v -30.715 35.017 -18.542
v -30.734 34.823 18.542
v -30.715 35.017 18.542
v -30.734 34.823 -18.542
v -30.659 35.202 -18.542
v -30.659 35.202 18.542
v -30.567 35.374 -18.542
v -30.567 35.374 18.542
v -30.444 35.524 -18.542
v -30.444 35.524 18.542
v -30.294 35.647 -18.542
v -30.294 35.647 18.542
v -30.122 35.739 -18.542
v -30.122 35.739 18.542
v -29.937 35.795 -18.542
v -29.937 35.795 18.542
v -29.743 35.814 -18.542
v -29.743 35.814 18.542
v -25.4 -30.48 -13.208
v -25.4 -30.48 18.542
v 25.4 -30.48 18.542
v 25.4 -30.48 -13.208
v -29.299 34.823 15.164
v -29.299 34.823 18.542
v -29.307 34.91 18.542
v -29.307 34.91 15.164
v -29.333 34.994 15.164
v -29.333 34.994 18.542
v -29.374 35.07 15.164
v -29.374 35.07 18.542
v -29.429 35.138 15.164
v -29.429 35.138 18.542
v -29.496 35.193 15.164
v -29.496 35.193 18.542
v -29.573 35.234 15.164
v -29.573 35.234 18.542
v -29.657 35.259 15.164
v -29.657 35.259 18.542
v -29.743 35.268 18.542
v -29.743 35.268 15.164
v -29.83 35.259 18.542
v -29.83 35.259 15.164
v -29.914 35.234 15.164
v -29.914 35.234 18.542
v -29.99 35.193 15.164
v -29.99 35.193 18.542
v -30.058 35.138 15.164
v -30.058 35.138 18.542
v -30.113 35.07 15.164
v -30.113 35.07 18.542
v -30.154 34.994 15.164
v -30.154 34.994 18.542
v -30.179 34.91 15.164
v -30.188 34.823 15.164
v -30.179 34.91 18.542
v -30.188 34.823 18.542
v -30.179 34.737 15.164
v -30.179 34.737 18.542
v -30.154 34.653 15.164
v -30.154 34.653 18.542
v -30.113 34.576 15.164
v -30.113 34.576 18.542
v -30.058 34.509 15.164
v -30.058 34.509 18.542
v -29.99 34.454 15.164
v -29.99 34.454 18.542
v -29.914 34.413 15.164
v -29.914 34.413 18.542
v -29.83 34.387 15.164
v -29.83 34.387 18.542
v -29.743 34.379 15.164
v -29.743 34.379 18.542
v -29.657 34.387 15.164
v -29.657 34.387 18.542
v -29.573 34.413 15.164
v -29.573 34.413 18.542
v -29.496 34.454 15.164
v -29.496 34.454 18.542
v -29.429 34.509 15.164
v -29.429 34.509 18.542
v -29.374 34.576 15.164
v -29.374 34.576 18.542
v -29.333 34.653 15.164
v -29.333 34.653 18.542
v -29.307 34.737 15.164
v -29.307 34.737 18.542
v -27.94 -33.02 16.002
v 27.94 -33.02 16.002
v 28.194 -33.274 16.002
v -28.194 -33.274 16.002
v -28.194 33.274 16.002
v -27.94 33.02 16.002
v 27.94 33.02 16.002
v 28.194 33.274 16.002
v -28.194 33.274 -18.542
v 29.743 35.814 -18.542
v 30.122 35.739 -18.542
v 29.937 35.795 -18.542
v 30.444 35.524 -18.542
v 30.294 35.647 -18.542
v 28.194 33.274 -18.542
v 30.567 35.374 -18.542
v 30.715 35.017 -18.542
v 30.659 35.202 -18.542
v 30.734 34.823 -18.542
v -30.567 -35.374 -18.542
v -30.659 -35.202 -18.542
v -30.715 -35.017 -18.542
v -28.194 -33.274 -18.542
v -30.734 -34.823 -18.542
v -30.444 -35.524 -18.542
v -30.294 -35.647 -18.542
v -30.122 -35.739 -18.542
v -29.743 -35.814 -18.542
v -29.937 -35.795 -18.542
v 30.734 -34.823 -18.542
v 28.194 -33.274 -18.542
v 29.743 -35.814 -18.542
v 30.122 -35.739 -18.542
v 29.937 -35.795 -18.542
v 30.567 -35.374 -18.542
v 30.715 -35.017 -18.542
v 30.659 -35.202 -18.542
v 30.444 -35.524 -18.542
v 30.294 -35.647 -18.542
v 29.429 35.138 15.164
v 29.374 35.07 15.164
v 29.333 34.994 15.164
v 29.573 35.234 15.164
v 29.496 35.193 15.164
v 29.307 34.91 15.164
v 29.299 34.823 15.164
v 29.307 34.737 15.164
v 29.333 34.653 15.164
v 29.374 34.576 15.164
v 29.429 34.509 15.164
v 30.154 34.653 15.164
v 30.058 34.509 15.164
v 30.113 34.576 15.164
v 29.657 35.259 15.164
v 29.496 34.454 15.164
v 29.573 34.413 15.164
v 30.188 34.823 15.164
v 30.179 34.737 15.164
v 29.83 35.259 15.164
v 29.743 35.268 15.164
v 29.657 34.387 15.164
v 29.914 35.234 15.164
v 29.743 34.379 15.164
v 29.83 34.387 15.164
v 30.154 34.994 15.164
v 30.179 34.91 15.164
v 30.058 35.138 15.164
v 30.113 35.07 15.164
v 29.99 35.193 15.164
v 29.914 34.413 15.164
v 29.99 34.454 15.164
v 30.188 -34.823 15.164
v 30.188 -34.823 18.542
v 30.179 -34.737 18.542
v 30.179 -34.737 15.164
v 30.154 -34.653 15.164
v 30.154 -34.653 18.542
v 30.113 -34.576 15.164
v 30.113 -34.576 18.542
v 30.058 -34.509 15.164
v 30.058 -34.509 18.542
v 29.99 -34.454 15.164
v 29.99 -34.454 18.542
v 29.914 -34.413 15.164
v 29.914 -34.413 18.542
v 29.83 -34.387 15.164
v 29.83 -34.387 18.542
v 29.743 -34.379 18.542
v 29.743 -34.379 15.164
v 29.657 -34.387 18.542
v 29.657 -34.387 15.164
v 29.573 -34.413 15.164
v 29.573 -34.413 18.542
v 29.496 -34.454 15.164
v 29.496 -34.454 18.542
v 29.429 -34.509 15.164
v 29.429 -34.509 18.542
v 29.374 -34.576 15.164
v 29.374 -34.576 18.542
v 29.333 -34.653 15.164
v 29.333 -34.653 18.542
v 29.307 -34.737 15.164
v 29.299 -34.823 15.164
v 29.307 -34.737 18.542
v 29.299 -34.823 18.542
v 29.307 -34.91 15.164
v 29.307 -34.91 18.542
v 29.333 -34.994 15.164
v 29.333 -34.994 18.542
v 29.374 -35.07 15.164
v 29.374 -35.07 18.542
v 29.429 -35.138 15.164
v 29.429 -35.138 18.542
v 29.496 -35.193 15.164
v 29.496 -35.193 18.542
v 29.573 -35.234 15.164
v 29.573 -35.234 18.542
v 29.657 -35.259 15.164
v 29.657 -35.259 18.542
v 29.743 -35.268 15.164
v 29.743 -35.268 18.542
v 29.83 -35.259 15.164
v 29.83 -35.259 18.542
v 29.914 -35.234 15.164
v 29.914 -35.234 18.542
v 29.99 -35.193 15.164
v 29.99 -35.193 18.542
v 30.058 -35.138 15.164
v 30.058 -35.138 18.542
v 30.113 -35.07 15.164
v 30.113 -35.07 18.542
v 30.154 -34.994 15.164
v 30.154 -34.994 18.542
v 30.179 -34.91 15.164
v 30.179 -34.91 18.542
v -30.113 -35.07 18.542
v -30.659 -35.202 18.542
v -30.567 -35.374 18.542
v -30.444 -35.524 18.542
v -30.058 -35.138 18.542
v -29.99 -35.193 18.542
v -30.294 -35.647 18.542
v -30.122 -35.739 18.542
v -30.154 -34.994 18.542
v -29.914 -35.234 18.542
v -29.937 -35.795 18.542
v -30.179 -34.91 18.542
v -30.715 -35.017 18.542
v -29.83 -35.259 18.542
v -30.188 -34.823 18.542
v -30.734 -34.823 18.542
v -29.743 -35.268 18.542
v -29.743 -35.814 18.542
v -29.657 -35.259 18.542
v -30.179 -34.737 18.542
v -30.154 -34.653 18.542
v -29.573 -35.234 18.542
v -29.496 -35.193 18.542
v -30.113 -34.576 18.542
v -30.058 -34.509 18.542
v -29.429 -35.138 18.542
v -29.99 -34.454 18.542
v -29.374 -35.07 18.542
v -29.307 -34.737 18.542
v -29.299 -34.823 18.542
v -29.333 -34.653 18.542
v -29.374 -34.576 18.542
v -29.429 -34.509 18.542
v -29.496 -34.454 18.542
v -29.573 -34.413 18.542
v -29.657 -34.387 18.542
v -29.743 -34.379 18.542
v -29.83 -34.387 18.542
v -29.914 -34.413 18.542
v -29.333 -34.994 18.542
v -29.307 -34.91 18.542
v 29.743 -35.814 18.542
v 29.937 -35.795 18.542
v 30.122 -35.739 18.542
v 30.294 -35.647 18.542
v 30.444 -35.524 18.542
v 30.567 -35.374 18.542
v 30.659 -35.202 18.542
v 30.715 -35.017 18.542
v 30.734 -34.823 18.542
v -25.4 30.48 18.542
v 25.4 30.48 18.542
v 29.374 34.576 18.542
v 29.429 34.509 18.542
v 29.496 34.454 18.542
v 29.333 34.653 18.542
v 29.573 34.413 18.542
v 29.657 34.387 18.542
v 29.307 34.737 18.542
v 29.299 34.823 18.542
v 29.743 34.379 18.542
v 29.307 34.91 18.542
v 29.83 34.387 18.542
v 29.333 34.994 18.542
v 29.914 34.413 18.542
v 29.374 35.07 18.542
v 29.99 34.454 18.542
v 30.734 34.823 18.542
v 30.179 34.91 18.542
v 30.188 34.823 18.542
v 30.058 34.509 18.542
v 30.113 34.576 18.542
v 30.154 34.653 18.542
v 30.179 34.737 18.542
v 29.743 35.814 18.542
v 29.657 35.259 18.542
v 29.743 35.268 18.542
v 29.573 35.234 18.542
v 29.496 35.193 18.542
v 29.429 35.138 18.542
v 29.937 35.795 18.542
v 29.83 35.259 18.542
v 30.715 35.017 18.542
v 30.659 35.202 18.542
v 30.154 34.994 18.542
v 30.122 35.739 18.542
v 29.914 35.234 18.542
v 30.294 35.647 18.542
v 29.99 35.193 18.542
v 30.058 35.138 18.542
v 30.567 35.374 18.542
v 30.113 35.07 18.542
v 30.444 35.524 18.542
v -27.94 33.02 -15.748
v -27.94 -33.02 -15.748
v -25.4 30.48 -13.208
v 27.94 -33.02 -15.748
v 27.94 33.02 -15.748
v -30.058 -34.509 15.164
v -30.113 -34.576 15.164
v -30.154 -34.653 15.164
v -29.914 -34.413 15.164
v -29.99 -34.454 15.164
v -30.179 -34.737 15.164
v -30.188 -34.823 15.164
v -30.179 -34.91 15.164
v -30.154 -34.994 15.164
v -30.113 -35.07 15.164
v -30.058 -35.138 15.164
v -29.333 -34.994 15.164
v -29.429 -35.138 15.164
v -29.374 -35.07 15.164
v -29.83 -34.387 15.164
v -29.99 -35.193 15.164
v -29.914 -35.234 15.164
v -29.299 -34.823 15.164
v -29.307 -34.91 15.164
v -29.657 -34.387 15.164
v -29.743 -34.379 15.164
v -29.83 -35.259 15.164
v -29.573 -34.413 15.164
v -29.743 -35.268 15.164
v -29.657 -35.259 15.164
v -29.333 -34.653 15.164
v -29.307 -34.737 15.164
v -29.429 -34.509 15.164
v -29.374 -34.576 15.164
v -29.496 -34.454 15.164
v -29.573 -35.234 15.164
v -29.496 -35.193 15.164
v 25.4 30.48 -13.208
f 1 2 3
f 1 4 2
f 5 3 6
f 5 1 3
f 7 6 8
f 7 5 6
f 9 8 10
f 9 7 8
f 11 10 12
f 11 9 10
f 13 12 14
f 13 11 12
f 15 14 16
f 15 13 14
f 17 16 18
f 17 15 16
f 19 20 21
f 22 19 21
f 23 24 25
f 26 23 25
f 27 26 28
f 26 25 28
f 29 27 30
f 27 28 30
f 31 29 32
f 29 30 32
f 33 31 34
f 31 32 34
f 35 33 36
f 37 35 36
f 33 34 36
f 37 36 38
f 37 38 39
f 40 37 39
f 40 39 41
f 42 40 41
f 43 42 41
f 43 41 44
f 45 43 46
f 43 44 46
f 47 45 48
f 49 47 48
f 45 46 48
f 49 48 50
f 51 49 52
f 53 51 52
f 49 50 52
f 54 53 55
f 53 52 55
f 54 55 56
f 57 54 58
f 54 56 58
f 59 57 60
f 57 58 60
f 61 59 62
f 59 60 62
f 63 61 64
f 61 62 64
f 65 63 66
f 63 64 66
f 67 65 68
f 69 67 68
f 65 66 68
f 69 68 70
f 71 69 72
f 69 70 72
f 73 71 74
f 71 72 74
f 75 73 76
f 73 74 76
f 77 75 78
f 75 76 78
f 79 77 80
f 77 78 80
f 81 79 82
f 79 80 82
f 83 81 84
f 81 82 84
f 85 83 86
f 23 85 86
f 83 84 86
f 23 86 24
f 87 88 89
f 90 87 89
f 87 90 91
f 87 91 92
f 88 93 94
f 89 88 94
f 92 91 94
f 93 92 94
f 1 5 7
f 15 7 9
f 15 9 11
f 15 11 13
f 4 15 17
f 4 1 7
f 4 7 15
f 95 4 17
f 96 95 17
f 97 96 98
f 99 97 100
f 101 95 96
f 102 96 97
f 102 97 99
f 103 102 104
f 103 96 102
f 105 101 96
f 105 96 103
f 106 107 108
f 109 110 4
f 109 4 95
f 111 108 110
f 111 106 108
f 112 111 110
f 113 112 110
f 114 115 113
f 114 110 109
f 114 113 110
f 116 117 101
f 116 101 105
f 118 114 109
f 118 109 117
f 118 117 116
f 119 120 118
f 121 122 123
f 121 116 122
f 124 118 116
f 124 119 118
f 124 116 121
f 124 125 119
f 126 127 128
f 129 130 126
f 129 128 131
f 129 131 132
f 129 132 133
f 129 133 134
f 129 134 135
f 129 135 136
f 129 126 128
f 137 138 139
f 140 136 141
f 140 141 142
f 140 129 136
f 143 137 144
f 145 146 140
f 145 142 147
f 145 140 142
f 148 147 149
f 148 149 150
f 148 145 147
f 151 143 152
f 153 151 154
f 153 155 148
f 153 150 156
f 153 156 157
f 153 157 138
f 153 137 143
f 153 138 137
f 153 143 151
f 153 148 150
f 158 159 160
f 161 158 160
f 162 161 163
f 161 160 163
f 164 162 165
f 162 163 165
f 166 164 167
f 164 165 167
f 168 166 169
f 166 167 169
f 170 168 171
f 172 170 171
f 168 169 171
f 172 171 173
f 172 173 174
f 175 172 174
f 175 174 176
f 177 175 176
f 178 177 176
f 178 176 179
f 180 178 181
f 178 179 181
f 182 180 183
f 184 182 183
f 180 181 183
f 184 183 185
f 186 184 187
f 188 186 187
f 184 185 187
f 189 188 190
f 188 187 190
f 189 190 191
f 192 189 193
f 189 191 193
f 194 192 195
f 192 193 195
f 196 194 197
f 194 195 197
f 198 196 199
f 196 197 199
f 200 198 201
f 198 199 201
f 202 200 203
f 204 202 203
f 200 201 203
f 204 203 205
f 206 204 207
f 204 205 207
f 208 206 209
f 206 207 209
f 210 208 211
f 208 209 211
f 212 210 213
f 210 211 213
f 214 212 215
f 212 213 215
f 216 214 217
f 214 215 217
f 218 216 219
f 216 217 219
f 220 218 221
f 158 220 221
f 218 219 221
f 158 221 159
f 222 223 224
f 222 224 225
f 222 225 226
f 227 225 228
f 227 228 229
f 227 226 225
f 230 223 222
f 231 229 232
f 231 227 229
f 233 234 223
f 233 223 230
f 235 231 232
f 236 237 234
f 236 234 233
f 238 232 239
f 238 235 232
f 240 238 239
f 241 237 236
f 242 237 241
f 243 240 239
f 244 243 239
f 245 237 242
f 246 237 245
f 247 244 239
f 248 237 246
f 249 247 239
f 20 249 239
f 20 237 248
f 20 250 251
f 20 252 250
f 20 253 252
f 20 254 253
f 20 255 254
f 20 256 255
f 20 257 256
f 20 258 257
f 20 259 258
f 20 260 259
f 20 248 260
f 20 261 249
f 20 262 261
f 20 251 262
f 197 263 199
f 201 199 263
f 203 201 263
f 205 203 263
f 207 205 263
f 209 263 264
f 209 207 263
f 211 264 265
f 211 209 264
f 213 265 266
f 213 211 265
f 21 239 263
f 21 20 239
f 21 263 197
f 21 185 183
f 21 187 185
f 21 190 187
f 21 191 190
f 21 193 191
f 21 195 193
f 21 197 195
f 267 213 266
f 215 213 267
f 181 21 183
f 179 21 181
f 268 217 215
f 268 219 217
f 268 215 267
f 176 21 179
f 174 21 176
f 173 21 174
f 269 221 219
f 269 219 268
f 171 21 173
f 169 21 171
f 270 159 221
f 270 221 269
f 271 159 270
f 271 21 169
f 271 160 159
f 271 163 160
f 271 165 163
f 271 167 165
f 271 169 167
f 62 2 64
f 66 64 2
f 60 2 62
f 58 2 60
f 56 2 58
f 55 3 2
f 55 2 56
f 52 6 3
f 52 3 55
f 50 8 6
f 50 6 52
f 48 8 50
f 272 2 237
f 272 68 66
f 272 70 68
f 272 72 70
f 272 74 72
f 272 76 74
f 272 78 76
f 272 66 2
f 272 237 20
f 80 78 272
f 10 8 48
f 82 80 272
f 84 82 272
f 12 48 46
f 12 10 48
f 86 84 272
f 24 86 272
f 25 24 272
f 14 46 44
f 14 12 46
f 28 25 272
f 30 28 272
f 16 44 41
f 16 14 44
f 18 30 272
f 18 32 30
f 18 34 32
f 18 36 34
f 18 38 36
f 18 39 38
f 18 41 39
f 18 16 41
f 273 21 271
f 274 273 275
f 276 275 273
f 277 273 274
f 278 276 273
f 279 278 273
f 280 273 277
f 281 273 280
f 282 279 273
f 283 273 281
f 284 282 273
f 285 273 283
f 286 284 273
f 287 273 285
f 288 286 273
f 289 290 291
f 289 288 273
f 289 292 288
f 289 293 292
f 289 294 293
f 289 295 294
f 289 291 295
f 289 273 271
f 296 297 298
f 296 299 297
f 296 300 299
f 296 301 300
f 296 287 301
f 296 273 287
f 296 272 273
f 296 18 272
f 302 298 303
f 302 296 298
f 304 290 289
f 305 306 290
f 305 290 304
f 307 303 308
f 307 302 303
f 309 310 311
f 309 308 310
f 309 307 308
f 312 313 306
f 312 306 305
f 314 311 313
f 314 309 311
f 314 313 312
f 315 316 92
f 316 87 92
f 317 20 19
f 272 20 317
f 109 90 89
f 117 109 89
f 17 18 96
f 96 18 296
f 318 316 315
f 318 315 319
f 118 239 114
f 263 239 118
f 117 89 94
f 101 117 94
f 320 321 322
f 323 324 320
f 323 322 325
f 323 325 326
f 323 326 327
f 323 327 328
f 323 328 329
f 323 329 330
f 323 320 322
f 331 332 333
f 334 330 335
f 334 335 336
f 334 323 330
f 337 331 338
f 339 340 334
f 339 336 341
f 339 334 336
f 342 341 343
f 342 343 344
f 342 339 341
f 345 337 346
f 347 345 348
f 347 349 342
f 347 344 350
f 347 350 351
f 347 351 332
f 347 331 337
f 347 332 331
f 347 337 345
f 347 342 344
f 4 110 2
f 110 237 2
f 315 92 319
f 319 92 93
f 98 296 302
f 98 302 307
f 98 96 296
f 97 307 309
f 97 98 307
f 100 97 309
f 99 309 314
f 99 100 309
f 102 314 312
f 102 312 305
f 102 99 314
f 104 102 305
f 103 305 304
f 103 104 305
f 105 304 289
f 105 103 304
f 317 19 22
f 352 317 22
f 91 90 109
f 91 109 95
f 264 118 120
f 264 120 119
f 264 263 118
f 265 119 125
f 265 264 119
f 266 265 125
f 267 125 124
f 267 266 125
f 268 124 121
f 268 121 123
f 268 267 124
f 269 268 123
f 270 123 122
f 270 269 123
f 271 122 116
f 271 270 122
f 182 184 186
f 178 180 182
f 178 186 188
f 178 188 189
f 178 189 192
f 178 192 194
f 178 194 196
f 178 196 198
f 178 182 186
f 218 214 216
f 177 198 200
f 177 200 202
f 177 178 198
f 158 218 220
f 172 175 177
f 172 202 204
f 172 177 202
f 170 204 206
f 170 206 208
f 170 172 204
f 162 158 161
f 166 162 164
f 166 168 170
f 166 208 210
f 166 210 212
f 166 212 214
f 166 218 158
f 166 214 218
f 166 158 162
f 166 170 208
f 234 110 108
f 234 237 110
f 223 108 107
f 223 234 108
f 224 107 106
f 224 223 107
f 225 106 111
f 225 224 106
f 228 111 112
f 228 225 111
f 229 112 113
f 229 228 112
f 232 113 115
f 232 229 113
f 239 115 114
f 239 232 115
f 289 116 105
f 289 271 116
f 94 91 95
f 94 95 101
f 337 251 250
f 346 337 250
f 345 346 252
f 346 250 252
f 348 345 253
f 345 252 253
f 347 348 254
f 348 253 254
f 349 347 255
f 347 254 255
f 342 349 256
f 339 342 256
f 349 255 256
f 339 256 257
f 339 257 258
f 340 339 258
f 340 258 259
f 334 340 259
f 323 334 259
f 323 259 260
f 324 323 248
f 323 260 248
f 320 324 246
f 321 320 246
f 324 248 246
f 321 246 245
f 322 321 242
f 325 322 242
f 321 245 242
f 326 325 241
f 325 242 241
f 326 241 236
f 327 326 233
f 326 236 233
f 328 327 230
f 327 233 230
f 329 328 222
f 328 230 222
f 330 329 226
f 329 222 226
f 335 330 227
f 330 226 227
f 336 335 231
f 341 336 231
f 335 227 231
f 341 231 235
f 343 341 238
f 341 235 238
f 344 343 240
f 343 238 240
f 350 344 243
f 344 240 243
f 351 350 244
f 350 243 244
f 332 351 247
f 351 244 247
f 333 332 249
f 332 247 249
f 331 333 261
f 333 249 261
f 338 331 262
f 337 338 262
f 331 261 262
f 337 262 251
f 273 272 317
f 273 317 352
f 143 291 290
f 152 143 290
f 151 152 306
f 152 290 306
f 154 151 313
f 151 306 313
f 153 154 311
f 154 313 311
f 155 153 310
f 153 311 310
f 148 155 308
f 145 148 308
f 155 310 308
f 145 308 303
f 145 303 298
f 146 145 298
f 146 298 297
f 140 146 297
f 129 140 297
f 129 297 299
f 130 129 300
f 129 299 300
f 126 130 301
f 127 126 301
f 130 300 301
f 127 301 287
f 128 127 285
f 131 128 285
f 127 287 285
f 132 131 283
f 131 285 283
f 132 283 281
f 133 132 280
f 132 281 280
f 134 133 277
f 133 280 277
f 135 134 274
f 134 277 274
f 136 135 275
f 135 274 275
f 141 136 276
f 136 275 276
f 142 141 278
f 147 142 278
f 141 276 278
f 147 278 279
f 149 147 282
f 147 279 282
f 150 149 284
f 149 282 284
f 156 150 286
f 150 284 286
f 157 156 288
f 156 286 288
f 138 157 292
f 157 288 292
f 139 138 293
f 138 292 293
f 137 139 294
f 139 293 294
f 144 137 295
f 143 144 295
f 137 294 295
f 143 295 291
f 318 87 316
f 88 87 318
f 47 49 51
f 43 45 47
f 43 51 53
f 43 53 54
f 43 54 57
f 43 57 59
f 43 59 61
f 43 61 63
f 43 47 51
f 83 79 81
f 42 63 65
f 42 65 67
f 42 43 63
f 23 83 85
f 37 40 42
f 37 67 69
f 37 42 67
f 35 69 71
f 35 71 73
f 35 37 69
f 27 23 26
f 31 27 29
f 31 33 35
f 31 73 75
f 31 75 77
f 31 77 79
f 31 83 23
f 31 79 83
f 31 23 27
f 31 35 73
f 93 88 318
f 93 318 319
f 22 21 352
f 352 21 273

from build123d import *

# Parameters (mm, degrees)
F0_W     = 61.468
F0_H     = 71.628
F0_W_2   = 50.8
F0_H_2   = 60.96
F1_DEPTH = 18.542
F2_W     = 50.8
F2_H     = 60.96
F3_DEPTH = 5.334
F4_R     = 0.9906
F5_T     = -2.54
F6_R     = 0.4445
F7_DEPTH = 3.3782


with BuildPart() as f1:
    # F0 (on Top) → F1 (new body, symmetric)
    with BuildSketch(Plane.XY):
        Rectangle(F0_W, F0_H)
        Rectangle(F0_W_2, F0_H_2, mode=Mode.SUBTRACT)
    extrude(amount=F1_DEPTH, both=True)

    # F2 (on face) → F3 (join)
    with BuildSketch(Plane(origin=(0, 0, -18.542), x_dir=(1, 0, 0), z_dir=(0, 0, -1))):
        Rectangle(F2_W, F2_H)
    extrude(amount=-F3_DEPTH)

    # F4
    f4_edges = [f1.edges().sort_by_distance(p)[0] for p in [
        (-30.734, 35.814, 0),
        (30.734, 35.814, 0),
        (30.734, -35.814, 0),
        (-30.734, -35.814, 0),
    ]]
    fillet(f4_edges, radius=F4_R)

    # F5
    f5_openings = [f1.faces().sort_by_distance(p)[0] for p in [
        (0, 0, -18.542),
    ]]
    offset(amount=F5_T, openings=f5_openings, kind=Kind.INTERSECTION)

    # F6 (on face) → F7 (cut)
    with BuildSketch(Plane.XY.offset(18.542)):
        with Locations((-29.7434, 34.8234)):
            Circle(F6_R)
        with Locations((29.7434, 34.8234)):
            Circle(F6_R)
        with Locations((29.7434, -34.8234)):
            Circle(F6_R)
        with Locations((-29.7434, -34.8234)):
            Circle(F6_R)
    extrude(amount=-F7_DEPTH, mode=Mode.SUBTRACT)


solid = f1.part
